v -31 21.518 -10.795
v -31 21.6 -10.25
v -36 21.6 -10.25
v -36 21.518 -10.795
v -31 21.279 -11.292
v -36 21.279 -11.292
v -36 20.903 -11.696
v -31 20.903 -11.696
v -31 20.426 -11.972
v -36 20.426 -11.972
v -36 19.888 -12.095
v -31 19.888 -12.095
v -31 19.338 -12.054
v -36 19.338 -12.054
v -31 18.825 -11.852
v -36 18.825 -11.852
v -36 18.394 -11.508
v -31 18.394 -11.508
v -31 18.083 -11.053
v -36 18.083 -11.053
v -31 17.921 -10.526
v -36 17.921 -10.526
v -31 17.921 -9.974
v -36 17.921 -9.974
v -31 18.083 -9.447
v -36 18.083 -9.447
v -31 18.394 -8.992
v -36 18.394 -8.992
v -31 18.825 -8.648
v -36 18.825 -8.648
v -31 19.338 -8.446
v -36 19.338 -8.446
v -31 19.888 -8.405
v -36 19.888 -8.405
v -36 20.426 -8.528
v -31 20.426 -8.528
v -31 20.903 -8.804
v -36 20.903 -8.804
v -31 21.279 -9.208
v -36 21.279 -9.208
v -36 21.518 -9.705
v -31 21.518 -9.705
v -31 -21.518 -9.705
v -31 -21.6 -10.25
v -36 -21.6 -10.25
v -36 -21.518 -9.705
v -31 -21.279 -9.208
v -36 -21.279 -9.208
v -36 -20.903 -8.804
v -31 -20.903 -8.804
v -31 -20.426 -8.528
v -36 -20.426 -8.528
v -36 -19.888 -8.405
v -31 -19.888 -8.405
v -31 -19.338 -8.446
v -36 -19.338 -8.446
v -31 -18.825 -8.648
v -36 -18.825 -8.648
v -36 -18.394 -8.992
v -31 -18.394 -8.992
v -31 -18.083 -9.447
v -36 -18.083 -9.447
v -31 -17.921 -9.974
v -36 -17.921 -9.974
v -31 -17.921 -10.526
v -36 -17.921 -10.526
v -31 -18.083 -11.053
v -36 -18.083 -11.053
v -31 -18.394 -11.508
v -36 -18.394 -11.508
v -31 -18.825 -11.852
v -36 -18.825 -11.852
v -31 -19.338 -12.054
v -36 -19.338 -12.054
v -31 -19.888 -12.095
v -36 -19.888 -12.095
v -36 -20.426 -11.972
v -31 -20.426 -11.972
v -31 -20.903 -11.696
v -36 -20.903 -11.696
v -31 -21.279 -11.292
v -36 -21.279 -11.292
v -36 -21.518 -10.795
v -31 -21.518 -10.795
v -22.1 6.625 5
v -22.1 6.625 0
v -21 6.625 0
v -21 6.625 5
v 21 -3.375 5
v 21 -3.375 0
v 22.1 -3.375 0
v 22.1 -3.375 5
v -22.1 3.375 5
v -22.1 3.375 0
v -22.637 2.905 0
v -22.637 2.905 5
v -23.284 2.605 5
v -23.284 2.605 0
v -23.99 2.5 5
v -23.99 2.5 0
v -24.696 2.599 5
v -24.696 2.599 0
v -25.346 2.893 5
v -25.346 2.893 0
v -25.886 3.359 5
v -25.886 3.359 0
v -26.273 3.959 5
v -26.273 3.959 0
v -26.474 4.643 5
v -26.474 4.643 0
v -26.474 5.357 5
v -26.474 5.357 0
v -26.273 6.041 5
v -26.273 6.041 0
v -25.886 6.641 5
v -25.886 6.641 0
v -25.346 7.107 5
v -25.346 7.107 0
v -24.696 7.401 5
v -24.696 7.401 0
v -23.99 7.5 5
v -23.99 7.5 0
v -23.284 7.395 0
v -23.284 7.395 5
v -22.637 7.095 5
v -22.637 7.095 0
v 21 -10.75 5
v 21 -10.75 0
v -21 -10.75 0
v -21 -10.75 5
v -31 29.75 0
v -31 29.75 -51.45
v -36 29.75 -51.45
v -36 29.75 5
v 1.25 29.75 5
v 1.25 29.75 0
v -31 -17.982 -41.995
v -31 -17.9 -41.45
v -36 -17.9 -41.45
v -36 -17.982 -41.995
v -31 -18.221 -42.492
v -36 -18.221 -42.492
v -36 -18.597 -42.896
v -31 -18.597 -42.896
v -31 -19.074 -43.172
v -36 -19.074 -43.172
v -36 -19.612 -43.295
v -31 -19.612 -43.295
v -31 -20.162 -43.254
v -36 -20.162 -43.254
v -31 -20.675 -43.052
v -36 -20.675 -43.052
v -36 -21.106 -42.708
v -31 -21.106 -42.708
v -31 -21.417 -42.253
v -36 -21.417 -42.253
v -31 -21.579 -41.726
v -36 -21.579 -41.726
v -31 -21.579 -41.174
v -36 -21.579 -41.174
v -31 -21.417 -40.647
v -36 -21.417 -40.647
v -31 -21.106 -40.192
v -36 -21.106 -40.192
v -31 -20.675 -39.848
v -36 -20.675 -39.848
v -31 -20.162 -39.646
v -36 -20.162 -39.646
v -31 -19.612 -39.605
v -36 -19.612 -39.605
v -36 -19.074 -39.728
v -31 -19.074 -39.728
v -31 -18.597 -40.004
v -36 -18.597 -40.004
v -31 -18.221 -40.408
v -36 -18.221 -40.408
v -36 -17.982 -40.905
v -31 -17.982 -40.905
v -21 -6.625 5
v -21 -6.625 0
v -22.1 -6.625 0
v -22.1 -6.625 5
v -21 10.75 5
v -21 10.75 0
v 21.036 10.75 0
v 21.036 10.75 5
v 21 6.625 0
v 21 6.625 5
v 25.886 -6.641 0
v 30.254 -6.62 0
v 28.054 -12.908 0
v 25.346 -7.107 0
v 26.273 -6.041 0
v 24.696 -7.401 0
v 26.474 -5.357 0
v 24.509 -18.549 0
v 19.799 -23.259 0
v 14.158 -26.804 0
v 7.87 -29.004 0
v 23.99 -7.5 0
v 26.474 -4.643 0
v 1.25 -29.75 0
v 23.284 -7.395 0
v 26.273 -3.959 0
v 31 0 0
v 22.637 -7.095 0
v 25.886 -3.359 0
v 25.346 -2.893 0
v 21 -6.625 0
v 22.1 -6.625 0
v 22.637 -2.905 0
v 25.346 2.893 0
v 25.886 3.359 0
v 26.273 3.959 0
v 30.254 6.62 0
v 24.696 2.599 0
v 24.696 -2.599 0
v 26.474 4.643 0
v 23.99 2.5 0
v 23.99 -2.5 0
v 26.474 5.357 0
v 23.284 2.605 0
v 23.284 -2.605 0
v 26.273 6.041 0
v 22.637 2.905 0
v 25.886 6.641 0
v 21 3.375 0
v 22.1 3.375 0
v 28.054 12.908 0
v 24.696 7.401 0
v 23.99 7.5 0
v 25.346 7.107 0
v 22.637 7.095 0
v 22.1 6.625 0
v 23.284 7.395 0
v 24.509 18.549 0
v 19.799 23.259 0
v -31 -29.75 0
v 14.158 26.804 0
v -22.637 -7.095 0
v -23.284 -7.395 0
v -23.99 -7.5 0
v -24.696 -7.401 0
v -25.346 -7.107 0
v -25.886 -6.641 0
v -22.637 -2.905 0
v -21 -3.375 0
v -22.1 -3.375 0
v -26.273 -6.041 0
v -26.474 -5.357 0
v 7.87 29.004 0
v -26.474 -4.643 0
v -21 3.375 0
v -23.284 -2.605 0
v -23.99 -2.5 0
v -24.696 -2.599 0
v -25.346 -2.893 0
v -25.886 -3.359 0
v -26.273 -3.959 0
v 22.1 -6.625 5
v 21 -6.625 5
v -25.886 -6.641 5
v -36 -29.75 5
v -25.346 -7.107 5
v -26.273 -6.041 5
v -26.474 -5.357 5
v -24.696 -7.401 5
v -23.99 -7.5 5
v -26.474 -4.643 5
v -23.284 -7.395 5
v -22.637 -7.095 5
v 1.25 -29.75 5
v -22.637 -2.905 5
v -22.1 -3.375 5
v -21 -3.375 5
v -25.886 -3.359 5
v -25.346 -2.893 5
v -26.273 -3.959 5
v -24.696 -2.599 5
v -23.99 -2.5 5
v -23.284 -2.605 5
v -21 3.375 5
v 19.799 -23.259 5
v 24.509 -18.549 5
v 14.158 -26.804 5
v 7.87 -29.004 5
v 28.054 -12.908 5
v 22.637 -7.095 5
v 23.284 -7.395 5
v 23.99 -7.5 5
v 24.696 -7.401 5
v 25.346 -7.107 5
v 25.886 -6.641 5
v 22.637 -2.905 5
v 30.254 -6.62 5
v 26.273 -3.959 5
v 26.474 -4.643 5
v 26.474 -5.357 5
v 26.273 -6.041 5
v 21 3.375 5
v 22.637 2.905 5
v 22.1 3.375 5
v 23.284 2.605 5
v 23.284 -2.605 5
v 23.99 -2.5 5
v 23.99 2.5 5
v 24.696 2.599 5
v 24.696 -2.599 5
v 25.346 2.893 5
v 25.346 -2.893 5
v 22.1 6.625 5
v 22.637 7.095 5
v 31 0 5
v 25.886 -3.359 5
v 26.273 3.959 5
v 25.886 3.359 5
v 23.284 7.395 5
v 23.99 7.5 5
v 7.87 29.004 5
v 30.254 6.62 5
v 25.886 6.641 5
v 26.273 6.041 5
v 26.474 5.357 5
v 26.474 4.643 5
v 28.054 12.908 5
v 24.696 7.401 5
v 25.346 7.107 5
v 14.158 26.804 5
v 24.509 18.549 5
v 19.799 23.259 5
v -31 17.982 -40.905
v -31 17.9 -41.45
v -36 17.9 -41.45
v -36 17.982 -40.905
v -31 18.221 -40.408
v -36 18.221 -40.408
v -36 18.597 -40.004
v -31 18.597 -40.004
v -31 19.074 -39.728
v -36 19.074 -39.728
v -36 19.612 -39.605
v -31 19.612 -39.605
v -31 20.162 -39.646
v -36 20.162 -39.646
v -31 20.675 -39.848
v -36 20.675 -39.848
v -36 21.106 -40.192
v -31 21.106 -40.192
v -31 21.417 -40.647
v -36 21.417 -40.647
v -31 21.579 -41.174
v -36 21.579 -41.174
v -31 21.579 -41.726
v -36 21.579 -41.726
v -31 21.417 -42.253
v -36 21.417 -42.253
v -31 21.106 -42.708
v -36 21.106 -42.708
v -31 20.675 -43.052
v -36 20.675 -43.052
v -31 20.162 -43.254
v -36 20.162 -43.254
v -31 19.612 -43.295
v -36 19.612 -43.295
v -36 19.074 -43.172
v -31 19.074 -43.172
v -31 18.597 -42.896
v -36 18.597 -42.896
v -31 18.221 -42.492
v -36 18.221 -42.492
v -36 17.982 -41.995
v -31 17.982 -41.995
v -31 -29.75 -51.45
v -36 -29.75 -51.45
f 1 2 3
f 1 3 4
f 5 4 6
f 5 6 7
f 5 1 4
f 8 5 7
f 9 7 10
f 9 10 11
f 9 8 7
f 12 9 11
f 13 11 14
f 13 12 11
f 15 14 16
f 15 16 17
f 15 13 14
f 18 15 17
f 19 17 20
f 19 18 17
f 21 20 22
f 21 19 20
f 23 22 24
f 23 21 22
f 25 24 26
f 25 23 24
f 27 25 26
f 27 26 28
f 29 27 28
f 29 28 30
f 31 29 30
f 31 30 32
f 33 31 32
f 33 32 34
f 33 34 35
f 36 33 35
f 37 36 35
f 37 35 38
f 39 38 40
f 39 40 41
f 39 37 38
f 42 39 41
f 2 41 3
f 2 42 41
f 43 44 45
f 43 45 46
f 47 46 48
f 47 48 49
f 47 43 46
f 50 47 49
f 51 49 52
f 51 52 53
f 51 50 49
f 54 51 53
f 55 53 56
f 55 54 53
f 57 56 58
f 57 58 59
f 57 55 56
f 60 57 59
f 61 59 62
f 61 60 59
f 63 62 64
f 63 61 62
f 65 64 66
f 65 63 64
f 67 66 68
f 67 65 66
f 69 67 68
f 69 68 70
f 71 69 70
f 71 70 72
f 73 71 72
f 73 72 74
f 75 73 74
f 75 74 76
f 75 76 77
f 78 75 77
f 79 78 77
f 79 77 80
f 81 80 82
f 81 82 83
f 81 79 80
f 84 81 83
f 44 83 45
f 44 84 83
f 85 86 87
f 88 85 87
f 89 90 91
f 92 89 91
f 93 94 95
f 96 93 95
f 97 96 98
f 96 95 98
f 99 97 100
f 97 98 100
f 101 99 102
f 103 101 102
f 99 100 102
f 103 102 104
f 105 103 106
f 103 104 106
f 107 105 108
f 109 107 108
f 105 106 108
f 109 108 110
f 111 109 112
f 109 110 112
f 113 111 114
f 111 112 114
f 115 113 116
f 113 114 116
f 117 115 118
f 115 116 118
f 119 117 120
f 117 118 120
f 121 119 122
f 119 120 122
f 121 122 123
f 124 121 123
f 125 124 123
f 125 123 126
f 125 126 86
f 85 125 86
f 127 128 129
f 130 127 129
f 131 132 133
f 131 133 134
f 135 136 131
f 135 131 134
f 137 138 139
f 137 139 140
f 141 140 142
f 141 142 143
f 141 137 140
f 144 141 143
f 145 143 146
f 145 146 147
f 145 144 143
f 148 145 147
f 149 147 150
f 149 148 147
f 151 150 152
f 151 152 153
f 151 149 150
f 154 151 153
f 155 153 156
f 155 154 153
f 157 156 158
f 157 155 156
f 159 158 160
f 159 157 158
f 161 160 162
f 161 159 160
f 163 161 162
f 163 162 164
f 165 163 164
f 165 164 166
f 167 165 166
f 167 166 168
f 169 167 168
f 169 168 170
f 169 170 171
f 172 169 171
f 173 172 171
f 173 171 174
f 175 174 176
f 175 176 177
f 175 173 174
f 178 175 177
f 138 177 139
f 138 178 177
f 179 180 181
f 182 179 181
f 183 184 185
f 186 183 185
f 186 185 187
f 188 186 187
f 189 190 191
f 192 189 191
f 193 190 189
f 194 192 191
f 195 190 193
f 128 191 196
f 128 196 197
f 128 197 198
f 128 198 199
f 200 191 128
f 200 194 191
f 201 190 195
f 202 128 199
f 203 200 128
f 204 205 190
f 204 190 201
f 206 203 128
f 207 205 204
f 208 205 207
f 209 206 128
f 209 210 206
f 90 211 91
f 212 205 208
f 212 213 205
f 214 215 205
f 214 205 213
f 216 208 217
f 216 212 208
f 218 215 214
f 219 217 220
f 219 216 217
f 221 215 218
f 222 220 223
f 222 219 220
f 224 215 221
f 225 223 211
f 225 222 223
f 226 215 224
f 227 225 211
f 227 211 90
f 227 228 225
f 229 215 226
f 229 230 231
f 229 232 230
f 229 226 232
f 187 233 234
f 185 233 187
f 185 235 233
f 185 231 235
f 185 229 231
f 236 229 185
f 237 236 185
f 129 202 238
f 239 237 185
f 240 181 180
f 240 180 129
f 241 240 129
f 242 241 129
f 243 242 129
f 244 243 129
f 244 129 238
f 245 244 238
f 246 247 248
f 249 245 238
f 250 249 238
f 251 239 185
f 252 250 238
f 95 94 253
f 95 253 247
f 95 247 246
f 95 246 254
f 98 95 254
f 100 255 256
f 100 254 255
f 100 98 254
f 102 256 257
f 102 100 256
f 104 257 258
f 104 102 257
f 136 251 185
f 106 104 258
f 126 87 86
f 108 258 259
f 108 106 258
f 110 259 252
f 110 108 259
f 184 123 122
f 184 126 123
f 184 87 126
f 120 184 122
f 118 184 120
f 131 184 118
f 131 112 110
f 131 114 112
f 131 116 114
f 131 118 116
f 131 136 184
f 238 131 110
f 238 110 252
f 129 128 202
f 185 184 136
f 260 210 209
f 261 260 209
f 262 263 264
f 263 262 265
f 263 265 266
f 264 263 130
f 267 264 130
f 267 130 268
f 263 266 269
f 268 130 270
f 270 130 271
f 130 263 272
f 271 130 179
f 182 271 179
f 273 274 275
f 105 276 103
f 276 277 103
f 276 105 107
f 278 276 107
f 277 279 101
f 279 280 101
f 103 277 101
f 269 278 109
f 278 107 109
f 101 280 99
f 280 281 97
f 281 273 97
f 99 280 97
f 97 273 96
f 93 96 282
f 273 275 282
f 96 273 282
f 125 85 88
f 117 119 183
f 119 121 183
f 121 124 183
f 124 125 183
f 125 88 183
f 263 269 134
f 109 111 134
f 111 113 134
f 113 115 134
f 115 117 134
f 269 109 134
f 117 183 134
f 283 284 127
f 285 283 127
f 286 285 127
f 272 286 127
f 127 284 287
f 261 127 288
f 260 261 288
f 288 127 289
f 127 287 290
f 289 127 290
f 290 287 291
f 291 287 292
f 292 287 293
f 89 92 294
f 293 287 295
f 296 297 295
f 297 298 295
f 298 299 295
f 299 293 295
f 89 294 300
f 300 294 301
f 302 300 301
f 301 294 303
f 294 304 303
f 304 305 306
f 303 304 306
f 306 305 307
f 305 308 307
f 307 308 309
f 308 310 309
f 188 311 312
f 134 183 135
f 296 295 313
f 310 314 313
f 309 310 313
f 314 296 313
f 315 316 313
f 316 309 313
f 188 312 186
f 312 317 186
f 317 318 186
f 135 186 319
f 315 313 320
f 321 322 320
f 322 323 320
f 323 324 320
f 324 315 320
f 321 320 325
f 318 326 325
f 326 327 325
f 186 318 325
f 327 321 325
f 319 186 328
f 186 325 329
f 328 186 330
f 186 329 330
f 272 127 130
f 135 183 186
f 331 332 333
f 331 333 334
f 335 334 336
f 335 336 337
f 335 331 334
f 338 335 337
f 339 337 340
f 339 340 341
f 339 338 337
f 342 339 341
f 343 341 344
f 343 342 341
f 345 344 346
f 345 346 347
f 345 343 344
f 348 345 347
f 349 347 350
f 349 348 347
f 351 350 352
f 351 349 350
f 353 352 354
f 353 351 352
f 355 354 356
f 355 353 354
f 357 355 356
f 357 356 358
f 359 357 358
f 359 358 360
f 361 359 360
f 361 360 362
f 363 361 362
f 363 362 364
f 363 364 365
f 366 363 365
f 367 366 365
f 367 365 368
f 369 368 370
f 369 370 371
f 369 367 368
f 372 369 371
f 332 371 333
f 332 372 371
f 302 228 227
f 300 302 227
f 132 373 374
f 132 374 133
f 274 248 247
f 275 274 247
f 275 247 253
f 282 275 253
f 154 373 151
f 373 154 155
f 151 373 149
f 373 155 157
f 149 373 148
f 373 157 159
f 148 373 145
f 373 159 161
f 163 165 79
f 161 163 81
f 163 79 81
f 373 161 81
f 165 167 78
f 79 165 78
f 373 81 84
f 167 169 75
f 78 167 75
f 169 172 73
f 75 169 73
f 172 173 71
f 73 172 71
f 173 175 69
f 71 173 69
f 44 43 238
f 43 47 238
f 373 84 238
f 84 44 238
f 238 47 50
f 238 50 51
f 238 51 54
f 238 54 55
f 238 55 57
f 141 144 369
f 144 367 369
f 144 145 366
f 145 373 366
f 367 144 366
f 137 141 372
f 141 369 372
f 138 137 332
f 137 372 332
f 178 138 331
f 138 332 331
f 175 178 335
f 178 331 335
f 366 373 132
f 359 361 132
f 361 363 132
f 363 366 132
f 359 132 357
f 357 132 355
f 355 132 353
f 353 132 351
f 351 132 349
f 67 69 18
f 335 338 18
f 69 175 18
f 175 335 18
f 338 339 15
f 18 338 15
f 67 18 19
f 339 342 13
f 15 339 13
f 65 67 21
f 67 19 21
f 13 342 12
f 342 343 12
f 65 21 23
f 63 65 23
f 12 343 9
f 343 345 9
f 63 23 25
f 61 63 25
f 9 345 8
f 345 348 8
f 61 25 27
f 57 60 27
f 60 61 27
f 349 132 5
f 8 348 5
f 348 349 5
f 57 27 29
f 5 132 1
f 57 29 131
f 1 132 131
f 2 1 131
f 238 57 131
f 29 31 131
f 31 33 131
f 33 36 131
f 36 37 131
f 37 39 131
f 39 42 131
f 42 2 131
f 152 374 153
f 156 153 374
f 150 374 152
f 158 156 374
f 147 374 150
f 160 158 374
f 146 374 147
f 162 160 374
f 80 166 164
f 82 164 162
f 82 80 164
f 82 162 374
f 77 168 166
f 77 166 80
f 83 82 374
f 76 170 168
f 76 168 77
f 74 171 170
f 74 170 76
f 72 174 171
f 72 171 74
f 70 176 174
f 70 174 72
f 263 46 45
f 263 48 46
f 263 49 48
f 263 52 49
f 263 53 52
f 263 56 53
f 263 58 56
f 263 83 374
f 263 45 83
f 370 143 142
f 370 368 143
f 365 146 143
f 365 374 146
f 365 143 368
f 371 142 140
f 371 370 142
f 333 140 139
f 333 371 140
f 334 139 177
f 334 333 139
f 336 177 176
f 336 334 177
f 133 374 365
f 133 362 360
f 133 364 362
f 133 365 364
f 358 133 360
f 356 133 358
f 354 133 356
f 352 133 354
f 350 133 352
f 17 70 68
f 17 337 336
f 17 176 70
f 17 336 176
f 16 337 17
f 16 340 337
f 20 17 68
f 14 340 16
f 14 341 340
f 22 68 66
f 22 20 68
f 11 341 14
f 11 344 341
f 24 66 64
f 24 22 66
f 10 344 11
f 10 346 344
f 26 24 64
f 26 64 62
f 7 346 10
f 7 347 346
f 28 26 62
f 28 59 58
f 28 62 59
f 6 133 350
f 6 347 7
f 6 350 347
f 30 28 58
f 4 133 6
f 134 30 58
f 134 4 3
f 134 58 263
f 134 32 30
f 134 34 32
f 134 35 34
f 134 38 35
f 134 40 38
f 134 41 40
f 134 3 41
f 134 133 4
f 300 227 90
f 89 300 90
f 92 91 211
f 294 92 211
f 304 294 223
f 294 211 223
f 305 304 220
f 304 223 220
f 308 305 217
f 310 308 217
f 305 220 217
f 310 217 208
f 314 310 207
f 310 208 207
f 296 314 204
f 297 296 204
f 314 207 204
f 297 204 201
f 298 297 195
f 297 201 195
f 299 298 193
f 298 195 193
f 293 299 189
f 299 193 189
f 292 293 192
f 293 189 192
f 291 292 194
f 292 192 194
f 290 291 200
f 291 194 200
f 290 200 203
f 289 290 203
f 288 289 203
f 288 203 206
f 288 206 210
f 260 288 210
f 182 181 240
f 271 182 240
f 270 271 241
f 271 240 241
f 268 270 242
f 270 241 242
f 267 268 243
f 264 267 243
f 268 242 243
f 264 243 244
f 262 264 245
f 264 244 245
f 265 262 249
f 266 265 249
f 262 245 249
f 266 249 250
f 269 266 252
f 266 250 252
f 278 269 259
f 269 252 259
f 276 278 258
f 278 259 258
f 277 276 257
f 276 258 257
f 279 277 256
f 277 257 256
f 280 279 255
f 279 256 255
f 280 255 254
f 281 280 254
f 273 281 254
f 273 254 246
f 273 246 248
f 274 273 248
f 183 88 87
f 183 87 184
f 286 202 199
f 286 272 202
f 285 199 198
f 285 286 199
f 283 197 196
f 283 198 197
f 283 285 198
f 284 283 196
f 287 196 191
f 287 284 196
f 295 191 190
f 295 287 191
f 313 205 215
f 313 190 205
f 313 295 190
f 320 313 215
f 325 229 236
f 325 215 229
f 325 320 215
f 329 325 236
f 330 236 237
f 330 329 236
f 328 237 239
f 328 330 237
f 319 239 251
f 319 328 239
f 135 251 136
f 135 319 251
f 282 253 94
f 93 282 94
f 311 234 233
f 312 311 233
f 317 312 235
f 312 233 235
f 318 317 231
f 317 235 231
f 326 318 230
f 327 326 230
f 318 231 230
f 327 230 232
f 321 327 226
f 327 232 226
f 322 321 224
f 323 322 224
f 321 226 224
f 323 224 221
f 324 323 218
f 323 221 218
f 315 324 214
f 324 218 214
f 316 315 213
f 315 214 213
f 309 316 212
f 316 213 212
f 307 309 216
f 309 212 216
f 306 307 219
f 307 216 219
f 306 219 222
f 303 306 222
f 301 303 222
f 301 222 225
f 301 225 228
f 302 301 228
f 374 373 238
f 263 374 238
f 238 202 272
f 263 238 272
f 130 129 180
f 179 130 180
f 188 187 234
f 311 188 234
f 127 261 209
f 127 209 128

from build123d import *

# Parameters (mm, degrees)
BOSS_EXTRUDE1_DEPTH = 5
SKETCH3_W           = 56.45
SKETCH3_H           = 59.5
SKETCH3_R           = 1.85
BOSS_EXTRUDE3_DEPTH = 5
FILLET2_RADIUS      = 29.75
FILLET2_LENGTH      = 5


with BuildPart() as part:
    # Sketch1 → Boss-Extrude1 (new body)
    with BuildSketch(Plane.XY):
        Polygon((-31, 29.75), (-21, 29.75), (21, 29.75), (31, 29.75), (31, -29.75), (21, -29.75), (-21, -29.75), (-31, -29.75), align=None)
        with BuildLine():
            Line((-22.100164481, 6.625), (-21, 6.625))
            Line((-21, 6.625), (-21, 10.75))
            Line((-21, 10.75), (21.035787675, 10.75))
            Line((21.035787675, 10.75), (21, 6.625))
            Line((21, 6.625), (22.100164481, 6.625))
            ThreePointArc((22.100164481, 6.625), (26.5, 5), (22.100164481, 3.375))
            Line((22.100164481, 3.375), (21, 3.375))
            Line((21, 3.375), (21, -3.375))
            Line((21, -3.375), (22.100164481, -3.375))
            ThreePointArc((22.100164481, -3.375), (26.5, -5), (22.100164481, -6.625))
            Line((22.100164481, -6.625), (21, -6.625))
            Line((21, -6.625), (21, -10.75))
            Line((21, -10.75), (-21, -10.75))
            Line((-21, -10.75), (-21, -6.625))
            Line((-21, -6.625), (-22.100164481, -6.625))
            ThreePointArc((-22.100164481, -6.625), (-26.5, -5), (-22.100164481, -3.375))
            Line((-22.100164481, -3.375), (-21, -3.375))
            Line((-21, -3.375), (-21, 3.375))
            Line((-21, 3.375), (-22.100164481, 3.375))
            ThreePointArc((-22.100164481, 3.375), (-26.5, 5), (-22.100164481, 6.625))
        make_face(mode=Mode.SUBTRACT)
    extrude(amount=BOSS_EXTRUDE1_DEPTH)

    # Sketch3 → Boss-Extrude3 (add)
    with BuildSketch(Plane.ZY.offset(31)):
        with Locations((-23.225, 0)):
            Rectangle(SKETCH3_W, SKETCH3_H)
        with Locations(Location((-41.45, 19.75, 0), (0, 0, 270))):
            Circle(SKETCH3_R, mode=Mode.SUBTRACT)
        with Locations(Location((-41.45, -19.75, 0), (0, 0, 90))):
            Circle(SKETCH3_R, mode=Mode.SUBTRACT)
        with Locations(Location((-10.25, -19.75, 0), (0, 0, 270))):
            Circle(SKETCH3_R, mode=Mode.SUBTRACT)
        with Locations(Location((-10.25, 19.75, 0), (0, 0, 90))):
            Circle(SKETCH3_R, mode=Mode.SUBTRACT)
    extrude(amount=BOSS_EXTRUDE3_DEPTH)

    # Fillet2: full round fillet: the end face becomes a half cylinder, R = half its width
    fillet2_face = Plane((31, 0, 2.5), x_dir=(0, 0, 1), z_dir=(1, 0, 0))  # on the end face: x along it, z out of the body
    fillet2_slab = fillet2_face.offset(-FILLET2_RADIUS / 2) * Box(FILLET2_LENGTH, 2 * FILLET2_RADIUS, FILLET2_RADIUS, mode=Mode.PRIVATE)  # the body's end, R deep
    fillet2_round = Plane((1.25, 0, 2.5), x_dir=(1, 0, 0), z_dir=(0, 0, 1)) * Cylinder(FILLET2_RADIUS, FILLET2_LENGTH, mode=Mode.PRIVATE)  # its axis R under the face
    add(fillet2_slab - fillet2_round, mode=Mode.SUBTRACT)


solid = part.part
